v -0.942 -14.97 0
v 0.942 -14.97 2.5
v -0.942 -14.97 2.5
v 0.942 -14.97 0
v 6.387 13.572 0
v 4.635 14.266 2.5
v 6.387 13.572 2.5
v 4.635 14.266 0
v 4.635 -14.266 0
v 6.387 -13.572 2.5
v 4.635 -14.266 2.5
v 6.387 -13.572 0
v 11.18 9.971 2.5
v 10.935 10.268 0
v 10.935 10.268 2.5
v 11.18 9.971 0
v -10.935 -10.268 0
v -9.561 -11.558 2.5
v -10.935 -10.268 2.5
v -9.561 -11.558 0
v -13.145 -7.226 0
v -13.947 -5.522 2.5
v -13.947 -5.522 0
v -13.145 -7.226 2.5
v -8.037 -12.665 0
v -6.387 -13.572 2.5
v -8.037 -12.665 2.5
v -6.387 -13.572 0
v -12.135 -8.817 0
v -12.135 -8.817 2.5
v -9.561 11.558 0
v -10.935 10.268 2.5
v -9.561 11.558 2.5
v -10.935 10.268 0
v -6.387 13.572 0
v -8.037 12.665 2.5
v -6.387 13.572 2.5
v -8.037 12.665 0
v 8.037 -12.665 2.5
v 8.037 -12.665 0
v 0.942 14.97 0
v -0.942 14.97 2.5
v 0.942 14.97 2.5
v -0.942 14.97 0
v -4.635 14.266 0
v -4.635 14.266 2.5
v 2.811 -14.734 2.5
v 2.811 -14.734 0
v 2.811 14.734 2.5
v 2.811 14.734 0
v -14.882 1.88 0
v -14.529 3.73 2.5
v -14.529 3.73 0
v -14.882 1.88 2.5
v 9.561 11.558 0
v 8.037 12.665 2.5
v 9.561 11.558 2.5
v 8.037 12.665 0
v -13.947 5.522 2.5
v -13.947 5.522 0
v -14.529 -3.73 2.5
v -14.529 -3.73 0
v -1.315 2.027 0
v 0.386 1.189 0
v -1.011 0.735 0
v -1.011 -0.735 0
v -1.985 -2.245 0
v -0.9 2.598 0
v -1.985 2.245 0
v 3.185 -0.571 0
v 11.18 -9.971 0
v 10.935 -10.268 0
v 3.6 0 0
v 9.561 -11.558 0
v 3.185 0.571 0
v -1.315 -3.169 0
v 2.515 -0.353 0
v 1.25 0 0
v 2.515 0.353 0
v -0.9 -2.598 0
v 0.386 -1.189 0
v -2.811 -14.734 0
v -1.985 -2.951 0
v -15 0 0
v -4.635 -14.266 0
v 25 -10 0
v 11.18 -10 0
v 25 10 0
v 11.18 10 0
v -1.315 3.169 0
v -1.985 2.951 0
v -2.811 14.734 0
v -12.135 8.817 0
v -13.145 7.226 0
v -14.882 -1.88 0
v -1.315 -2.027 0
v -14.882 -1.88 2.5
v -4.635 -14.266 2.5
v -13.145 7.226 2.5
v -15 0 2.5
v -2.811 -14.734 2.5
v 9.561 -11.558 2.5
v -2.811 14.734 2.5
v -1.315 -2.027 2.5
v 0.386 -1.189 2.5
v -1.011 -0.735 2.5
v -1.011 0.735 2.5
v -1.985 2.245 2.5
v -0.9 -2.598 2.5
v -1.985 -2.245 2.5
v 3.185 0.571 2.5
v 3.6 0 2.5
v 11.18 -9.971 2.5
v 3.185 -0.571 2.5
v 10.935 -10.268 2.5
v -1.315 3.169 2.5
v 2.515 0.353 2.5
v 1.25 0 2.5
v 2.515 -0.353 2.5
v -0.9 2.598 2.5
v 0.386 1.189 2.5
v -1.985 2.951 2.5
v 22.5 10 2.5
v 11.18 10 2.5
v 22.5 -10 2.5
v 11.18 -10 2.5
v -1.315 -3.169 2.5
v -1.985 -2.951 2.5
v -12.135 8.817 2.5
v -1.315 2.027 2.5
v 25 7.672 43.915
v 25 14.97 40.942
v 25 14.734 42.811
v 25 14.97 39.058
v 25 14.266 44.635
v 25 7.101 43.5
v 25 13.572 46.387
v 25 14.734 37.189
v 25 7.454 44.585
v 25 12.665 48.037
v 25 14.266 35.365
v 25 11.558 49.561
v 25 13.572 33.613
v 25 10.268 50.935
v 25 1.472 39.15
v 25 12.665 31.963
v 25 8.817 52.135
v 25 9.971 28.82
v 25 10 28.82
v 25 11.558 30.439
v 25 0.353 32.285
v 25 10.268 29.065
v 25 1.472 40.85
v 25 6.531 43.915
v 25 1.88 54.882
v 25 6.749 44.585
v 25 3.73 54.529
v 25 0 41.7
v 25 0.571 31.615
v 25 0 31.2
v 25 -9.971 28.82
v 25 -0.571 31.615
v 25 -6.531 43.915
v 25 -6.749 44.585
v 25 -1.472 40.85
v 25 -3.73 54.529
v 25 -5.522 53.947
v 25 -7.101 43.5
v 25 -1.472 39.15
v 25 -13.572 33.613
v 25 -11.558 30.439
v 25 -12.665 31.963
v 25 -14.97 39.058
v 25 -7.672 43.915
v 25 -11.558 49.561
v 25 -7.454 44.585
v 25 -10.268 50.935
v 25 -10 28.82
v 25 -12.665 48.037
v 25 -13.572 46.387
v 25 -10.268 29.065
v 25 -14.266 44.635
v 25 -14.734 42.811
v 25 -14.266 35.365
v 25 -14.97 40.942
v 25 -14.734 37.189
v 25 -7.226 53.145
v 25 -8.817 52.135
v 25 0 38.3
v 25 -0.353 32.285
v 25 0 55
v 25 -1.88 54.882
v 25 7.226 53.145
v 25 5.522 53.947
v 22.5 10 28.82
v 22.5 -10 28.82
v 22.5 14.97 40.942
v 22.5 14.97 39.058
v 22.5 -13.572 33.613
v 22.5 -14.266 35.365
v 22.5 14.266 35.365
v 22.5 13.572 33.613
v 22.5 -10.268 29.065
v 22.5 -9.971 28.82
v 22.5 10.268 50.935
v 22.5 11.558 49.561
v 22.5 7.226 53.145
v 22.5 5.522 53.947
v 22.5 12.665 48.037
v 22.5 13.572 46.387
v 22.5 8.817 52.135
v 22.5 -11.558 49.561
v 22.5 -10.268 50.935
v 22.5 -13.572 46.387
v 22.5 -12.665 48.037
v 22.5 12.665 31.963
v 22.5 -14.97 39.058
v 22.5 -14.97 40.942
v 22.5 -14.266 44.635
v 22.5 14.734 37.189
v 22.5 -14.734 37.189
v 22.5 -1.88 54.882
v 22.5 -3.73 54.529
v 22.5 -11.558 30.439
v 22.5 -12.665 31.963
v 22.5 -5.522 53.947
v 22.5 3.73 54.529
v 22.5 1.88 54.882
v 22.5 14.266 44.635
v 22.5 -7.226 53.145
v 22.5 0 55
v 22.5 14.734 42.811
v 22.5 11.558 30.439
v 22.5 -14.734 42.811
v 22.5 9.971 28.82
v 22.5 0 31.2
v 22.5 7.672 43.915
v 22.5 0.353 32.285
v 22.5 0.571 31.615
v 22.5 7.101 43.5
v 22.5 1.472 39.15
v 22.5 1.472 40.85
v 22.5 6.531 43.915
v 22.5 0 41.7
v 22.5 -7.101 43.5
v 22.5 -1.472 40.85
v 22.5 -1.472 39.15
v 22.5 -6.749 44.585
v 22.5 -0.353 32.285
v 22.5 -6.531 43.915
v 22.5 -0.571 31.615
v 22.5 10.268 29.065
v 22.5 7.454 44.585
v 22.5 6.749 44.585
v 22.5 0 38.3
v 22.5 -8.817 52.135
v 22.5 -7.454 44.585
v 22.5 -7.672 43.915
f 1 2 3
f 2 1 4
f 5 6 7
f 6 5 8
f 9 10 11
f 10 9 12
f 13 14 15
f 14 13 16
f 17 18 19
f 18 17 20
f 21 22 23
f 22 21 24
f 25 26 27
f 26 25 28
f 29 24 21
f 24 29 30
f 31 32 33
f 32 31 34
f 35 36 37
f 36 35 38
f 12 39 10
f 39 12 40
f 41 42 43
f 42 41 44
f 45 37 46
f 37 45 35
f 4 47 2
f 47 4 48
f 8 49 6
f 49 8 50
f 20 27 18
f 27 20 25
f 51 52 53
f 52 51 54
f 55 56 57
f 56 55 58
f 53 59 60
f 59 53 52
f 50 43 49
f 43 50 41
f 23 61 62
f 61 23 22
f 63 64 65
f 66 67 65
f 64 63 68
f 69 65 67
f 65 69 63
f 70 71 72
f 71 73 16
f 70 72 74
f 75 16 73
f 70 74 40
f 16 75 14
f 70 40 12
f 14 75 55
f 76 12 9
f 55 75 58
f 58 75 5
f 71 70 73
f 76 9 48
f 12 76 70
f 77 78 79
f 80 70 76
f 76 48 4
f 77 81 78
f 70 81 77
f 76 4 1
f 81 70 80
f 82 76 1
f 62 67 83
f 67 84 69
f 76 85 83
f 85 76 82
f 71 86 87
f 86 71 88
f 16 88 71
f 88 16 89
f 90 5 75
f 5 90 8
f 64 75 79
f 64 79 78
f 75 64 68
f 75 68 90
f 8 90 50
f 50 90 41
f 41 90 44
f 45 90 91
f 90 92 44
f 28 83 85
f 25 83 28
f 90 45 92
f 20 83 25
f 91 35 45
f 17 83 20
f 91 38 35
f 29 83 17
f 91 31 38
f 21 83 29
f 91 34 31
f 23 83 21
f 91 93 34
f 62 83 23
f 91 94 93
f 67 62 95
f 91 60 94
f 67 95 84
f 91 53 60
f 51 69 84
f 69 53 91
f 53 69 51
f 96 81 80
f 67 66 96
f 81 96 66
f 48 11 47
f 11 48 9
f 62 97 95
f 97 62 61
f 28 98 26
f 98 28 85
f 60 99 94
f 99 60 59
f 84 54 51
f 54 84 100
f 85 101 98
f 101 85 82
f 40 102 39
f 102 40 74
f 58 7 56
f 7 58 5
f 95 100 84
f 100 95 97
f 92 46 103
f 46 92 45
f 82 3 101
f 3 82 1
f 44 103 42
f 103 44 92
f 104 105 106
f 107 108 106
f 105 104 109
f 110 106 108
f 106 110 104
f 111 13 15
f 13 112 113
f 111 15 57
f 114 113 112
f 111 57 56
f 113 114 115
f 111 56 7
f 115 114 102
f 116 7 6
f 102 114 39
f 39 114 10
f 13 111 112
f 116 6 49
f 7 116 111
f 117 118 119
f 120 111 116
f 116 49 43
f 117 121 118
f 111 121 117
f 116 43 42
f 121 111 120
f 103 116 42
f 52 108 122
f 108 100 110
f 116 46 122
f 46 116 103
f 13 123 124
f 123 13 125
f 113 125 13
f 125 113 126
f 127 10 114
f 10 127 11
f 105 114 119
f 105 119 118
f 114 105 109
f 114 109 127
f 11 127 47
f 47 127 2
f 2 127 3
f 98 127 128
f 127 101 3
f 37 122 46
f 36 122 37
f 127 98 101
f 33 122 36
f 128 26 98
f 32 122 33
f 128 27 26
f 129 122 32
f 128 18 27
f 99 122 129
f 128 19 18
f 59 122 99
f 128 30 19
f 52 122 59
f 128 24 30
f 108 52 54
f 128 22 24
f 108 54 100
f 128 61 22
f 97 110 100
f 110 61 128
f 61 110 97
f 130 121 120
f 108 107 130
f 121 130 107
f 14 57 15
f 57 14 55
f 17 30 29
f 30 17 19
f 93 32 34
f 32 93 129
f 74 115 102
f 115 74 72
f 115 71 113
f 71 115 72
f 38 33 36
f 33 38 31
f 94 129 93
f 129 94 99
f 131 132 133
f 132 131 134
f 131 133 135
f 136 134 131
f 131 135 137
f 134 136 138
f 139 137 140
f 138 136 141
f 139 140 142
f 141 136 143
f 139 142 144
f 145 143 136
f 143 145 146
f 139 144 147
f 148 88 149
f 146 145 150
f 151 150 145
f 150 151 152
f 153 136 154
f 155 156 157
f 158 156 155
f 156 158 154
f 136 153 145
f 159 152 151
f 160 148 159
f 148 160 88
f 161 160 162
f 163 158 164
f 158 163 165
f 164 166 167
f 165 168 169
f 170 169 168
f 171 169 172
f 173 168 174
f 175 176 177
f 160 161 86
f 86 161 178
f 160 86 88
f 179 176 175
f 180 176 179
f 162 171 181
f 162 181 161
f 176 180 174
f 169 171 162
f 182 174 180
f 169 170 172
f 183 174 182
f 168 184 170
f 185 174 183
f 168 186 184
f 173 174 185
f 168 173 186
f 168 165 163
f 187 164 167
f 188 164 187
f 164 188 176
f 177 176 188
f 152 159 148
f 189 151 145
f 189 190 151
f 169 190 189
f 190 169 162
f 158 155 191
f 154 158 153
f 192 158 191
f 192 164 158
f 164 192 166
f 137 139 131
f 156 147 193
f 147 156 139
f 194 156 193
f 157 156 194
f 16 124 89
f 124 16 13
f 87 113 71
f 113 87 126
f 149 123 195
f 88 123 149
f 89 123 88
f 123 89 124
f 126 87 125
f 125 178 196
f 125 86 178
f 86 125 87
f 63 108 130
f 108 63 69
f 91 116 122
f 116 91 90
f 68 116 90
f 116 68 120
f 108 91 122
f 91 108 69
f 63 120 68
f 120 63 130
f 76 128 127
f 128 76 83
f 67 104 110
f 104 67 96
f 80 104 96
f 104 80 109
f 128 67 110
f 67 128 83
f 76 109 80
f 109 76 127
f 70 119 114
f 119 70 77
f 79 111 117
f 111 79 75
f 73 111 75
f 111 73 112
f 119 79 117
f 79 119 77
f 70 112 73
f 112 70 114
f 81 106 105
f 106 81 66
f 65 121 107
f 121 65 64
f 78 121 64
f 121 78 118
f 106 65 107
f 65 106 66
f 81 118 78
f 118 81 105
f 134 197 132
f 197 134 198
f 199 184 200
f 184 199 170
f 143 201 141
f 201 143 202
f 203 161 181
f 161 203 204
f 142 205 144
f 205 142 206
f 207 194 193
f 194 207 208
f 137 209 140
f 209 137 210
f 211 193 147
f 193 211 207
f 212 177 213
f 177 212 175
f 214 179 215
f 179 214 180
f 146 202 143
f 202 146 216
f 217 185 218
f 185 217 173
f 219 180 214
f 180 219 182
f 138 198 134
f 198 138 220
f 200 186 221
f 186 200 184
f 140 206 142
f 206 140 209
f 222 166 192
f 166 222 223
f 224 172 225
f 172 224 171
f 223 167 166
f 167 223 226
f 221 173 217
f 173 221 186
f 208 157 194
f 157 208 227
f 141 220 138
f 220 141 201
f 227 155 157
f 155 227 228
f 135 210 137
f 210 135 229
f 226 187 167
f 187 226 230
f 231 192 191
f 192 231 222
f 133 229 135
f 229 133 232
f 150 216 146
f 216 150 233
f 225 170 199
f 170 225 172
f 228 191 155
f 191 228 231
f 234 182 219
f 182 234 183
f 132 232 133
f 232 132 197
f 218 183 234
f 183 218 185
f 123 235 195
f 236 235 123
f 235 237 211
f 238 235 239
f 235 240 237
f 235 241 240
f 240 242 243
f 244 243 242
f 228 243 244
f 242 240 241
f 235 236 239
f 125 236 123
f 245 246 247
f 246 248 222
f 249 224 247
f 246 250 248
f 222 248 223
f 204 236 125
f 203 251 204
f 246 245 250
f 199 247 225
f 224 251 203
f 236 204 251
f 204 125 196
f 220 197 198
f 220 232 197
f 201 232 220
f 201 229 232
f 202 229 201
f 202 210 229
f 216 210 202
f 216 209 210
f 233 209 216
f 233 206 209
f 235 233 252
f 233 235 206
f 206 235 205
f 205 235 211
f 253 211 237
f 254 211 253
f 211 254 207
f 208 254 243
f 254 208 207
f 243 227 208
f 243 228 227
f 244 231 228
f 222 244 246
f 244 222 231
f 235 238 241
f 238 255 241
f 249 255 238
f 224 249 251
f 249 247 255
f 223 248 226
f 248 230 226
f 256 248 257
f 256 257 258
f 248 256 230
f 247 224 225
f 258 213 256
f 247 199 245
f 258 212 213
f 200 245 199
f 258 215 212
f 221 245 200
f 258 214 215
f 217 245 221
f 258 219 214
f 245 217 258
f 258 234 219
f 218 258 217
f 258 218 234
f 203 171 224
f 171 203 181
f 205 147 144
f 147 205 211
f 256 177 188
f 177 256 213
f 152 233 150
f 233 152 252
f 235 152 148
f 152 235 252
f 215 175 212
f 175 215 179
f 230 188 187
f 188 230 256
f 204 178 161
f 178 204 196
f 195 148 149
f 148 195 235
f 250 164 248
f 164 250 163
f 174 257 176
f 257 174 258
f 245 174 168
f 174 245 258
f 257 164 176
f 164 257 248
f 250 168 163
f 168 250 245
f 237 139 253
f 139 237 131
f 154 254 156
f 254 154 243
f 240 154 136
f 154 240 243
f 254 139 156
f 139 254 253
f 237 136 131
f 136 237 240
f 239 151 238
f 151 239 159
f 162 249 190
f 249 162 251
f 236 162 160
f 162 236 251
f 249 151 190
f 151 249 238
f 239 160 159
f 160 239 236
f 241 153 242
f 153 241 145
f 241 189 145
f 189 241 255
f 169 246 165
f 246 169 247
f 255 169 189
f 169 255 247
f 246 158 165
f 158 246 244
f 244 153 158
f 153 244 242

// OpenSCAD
module mounting_holes(num_holes, hole_location_radius, hole_diam, thickness){
    for(i = [1 : num_holes]){
        translate([
                hole_location_radius * cos(i * (360 / num_holes)),
                hole_location_radius * sin(i * (360 / num_holes)),
                0
        ])
       cylinder(r = hole_diam / 2.0, h = thickness);
   }
};

module wire_header_cutout(){
}

module central_hole_cutout(diam, thickness)
{
    cylinder(r = diam /2, h = thickness);
}

module mounting_surface(diam, thickness)
{
    $fn = 50;
    cylinder(r = diam / 2, h = thickness);
}

module mounting_plate(plate_diam, thickness, hole_location_radius, hole_diam, num_holes, central_hole_diam, arm_width, arm_length){
    r = plate_diam / 2;
    sagitta = r - sqrt(pow(r, 2) - pow(arm_width /2, 2));
    difference(){
        union(){
            mounting_surface(plate_diam, thickness);
            translate([r - sagitta, -arm_width/2, 0])
            cube([sagitta + arm_length, arm_width, thickness]);
        }
        mounting_holes(num_holes, hole_location_radius, hole_diam, thickness);
        central_hole_cutout(central_hole_diam, thickness);
    }
}

module roll_bracket(){
    plate_diam = 30;
    thickness = 2.5;
    hole_diam = 1.2;
    num_holes = 3.0;
    arm_width = 20;
    roll_motor_mount_holes_radius = 3;
    roll_motor_mount_central_hole = 2.5;
    roll_motor_arm_length = 10.0;
    pitch_motor_mount_holes_radius = 8.2;
    pitch_motor_mount_central_hole = 3.4;
    pitch_motor_arm_length = 25;

    union(){
        //roll motor mount
        mounting_plate(
            plate_diam,
            thickness,
            roll_motor_mount_holes_radius,
            hole_diam,
            num_holes,
            roll_motor_mount_central_hole,
            arm_width,
            roll_motor_arm_length
        );
        translate([
            roll_motor_arm_length + plate_diam / 2,
            0,
            pitch_motor_arm_length + plate_diam / 2
        ])
        rotate([0, 90, 180])
        mounting_plate(
            plate_diam,
            thickness,
            pitch_motor_mount_holes_radius,
            hole_diam,
            num_holes,
            pitch_motor_mount_central_hole,
            arm_width,
            pitch_motor_arm_length
        );
   }
}
// run
roll_bracket();
/* mounting_plate(30, 0.05, 5.5, 1.6, 3, 4, 20, 20); */
